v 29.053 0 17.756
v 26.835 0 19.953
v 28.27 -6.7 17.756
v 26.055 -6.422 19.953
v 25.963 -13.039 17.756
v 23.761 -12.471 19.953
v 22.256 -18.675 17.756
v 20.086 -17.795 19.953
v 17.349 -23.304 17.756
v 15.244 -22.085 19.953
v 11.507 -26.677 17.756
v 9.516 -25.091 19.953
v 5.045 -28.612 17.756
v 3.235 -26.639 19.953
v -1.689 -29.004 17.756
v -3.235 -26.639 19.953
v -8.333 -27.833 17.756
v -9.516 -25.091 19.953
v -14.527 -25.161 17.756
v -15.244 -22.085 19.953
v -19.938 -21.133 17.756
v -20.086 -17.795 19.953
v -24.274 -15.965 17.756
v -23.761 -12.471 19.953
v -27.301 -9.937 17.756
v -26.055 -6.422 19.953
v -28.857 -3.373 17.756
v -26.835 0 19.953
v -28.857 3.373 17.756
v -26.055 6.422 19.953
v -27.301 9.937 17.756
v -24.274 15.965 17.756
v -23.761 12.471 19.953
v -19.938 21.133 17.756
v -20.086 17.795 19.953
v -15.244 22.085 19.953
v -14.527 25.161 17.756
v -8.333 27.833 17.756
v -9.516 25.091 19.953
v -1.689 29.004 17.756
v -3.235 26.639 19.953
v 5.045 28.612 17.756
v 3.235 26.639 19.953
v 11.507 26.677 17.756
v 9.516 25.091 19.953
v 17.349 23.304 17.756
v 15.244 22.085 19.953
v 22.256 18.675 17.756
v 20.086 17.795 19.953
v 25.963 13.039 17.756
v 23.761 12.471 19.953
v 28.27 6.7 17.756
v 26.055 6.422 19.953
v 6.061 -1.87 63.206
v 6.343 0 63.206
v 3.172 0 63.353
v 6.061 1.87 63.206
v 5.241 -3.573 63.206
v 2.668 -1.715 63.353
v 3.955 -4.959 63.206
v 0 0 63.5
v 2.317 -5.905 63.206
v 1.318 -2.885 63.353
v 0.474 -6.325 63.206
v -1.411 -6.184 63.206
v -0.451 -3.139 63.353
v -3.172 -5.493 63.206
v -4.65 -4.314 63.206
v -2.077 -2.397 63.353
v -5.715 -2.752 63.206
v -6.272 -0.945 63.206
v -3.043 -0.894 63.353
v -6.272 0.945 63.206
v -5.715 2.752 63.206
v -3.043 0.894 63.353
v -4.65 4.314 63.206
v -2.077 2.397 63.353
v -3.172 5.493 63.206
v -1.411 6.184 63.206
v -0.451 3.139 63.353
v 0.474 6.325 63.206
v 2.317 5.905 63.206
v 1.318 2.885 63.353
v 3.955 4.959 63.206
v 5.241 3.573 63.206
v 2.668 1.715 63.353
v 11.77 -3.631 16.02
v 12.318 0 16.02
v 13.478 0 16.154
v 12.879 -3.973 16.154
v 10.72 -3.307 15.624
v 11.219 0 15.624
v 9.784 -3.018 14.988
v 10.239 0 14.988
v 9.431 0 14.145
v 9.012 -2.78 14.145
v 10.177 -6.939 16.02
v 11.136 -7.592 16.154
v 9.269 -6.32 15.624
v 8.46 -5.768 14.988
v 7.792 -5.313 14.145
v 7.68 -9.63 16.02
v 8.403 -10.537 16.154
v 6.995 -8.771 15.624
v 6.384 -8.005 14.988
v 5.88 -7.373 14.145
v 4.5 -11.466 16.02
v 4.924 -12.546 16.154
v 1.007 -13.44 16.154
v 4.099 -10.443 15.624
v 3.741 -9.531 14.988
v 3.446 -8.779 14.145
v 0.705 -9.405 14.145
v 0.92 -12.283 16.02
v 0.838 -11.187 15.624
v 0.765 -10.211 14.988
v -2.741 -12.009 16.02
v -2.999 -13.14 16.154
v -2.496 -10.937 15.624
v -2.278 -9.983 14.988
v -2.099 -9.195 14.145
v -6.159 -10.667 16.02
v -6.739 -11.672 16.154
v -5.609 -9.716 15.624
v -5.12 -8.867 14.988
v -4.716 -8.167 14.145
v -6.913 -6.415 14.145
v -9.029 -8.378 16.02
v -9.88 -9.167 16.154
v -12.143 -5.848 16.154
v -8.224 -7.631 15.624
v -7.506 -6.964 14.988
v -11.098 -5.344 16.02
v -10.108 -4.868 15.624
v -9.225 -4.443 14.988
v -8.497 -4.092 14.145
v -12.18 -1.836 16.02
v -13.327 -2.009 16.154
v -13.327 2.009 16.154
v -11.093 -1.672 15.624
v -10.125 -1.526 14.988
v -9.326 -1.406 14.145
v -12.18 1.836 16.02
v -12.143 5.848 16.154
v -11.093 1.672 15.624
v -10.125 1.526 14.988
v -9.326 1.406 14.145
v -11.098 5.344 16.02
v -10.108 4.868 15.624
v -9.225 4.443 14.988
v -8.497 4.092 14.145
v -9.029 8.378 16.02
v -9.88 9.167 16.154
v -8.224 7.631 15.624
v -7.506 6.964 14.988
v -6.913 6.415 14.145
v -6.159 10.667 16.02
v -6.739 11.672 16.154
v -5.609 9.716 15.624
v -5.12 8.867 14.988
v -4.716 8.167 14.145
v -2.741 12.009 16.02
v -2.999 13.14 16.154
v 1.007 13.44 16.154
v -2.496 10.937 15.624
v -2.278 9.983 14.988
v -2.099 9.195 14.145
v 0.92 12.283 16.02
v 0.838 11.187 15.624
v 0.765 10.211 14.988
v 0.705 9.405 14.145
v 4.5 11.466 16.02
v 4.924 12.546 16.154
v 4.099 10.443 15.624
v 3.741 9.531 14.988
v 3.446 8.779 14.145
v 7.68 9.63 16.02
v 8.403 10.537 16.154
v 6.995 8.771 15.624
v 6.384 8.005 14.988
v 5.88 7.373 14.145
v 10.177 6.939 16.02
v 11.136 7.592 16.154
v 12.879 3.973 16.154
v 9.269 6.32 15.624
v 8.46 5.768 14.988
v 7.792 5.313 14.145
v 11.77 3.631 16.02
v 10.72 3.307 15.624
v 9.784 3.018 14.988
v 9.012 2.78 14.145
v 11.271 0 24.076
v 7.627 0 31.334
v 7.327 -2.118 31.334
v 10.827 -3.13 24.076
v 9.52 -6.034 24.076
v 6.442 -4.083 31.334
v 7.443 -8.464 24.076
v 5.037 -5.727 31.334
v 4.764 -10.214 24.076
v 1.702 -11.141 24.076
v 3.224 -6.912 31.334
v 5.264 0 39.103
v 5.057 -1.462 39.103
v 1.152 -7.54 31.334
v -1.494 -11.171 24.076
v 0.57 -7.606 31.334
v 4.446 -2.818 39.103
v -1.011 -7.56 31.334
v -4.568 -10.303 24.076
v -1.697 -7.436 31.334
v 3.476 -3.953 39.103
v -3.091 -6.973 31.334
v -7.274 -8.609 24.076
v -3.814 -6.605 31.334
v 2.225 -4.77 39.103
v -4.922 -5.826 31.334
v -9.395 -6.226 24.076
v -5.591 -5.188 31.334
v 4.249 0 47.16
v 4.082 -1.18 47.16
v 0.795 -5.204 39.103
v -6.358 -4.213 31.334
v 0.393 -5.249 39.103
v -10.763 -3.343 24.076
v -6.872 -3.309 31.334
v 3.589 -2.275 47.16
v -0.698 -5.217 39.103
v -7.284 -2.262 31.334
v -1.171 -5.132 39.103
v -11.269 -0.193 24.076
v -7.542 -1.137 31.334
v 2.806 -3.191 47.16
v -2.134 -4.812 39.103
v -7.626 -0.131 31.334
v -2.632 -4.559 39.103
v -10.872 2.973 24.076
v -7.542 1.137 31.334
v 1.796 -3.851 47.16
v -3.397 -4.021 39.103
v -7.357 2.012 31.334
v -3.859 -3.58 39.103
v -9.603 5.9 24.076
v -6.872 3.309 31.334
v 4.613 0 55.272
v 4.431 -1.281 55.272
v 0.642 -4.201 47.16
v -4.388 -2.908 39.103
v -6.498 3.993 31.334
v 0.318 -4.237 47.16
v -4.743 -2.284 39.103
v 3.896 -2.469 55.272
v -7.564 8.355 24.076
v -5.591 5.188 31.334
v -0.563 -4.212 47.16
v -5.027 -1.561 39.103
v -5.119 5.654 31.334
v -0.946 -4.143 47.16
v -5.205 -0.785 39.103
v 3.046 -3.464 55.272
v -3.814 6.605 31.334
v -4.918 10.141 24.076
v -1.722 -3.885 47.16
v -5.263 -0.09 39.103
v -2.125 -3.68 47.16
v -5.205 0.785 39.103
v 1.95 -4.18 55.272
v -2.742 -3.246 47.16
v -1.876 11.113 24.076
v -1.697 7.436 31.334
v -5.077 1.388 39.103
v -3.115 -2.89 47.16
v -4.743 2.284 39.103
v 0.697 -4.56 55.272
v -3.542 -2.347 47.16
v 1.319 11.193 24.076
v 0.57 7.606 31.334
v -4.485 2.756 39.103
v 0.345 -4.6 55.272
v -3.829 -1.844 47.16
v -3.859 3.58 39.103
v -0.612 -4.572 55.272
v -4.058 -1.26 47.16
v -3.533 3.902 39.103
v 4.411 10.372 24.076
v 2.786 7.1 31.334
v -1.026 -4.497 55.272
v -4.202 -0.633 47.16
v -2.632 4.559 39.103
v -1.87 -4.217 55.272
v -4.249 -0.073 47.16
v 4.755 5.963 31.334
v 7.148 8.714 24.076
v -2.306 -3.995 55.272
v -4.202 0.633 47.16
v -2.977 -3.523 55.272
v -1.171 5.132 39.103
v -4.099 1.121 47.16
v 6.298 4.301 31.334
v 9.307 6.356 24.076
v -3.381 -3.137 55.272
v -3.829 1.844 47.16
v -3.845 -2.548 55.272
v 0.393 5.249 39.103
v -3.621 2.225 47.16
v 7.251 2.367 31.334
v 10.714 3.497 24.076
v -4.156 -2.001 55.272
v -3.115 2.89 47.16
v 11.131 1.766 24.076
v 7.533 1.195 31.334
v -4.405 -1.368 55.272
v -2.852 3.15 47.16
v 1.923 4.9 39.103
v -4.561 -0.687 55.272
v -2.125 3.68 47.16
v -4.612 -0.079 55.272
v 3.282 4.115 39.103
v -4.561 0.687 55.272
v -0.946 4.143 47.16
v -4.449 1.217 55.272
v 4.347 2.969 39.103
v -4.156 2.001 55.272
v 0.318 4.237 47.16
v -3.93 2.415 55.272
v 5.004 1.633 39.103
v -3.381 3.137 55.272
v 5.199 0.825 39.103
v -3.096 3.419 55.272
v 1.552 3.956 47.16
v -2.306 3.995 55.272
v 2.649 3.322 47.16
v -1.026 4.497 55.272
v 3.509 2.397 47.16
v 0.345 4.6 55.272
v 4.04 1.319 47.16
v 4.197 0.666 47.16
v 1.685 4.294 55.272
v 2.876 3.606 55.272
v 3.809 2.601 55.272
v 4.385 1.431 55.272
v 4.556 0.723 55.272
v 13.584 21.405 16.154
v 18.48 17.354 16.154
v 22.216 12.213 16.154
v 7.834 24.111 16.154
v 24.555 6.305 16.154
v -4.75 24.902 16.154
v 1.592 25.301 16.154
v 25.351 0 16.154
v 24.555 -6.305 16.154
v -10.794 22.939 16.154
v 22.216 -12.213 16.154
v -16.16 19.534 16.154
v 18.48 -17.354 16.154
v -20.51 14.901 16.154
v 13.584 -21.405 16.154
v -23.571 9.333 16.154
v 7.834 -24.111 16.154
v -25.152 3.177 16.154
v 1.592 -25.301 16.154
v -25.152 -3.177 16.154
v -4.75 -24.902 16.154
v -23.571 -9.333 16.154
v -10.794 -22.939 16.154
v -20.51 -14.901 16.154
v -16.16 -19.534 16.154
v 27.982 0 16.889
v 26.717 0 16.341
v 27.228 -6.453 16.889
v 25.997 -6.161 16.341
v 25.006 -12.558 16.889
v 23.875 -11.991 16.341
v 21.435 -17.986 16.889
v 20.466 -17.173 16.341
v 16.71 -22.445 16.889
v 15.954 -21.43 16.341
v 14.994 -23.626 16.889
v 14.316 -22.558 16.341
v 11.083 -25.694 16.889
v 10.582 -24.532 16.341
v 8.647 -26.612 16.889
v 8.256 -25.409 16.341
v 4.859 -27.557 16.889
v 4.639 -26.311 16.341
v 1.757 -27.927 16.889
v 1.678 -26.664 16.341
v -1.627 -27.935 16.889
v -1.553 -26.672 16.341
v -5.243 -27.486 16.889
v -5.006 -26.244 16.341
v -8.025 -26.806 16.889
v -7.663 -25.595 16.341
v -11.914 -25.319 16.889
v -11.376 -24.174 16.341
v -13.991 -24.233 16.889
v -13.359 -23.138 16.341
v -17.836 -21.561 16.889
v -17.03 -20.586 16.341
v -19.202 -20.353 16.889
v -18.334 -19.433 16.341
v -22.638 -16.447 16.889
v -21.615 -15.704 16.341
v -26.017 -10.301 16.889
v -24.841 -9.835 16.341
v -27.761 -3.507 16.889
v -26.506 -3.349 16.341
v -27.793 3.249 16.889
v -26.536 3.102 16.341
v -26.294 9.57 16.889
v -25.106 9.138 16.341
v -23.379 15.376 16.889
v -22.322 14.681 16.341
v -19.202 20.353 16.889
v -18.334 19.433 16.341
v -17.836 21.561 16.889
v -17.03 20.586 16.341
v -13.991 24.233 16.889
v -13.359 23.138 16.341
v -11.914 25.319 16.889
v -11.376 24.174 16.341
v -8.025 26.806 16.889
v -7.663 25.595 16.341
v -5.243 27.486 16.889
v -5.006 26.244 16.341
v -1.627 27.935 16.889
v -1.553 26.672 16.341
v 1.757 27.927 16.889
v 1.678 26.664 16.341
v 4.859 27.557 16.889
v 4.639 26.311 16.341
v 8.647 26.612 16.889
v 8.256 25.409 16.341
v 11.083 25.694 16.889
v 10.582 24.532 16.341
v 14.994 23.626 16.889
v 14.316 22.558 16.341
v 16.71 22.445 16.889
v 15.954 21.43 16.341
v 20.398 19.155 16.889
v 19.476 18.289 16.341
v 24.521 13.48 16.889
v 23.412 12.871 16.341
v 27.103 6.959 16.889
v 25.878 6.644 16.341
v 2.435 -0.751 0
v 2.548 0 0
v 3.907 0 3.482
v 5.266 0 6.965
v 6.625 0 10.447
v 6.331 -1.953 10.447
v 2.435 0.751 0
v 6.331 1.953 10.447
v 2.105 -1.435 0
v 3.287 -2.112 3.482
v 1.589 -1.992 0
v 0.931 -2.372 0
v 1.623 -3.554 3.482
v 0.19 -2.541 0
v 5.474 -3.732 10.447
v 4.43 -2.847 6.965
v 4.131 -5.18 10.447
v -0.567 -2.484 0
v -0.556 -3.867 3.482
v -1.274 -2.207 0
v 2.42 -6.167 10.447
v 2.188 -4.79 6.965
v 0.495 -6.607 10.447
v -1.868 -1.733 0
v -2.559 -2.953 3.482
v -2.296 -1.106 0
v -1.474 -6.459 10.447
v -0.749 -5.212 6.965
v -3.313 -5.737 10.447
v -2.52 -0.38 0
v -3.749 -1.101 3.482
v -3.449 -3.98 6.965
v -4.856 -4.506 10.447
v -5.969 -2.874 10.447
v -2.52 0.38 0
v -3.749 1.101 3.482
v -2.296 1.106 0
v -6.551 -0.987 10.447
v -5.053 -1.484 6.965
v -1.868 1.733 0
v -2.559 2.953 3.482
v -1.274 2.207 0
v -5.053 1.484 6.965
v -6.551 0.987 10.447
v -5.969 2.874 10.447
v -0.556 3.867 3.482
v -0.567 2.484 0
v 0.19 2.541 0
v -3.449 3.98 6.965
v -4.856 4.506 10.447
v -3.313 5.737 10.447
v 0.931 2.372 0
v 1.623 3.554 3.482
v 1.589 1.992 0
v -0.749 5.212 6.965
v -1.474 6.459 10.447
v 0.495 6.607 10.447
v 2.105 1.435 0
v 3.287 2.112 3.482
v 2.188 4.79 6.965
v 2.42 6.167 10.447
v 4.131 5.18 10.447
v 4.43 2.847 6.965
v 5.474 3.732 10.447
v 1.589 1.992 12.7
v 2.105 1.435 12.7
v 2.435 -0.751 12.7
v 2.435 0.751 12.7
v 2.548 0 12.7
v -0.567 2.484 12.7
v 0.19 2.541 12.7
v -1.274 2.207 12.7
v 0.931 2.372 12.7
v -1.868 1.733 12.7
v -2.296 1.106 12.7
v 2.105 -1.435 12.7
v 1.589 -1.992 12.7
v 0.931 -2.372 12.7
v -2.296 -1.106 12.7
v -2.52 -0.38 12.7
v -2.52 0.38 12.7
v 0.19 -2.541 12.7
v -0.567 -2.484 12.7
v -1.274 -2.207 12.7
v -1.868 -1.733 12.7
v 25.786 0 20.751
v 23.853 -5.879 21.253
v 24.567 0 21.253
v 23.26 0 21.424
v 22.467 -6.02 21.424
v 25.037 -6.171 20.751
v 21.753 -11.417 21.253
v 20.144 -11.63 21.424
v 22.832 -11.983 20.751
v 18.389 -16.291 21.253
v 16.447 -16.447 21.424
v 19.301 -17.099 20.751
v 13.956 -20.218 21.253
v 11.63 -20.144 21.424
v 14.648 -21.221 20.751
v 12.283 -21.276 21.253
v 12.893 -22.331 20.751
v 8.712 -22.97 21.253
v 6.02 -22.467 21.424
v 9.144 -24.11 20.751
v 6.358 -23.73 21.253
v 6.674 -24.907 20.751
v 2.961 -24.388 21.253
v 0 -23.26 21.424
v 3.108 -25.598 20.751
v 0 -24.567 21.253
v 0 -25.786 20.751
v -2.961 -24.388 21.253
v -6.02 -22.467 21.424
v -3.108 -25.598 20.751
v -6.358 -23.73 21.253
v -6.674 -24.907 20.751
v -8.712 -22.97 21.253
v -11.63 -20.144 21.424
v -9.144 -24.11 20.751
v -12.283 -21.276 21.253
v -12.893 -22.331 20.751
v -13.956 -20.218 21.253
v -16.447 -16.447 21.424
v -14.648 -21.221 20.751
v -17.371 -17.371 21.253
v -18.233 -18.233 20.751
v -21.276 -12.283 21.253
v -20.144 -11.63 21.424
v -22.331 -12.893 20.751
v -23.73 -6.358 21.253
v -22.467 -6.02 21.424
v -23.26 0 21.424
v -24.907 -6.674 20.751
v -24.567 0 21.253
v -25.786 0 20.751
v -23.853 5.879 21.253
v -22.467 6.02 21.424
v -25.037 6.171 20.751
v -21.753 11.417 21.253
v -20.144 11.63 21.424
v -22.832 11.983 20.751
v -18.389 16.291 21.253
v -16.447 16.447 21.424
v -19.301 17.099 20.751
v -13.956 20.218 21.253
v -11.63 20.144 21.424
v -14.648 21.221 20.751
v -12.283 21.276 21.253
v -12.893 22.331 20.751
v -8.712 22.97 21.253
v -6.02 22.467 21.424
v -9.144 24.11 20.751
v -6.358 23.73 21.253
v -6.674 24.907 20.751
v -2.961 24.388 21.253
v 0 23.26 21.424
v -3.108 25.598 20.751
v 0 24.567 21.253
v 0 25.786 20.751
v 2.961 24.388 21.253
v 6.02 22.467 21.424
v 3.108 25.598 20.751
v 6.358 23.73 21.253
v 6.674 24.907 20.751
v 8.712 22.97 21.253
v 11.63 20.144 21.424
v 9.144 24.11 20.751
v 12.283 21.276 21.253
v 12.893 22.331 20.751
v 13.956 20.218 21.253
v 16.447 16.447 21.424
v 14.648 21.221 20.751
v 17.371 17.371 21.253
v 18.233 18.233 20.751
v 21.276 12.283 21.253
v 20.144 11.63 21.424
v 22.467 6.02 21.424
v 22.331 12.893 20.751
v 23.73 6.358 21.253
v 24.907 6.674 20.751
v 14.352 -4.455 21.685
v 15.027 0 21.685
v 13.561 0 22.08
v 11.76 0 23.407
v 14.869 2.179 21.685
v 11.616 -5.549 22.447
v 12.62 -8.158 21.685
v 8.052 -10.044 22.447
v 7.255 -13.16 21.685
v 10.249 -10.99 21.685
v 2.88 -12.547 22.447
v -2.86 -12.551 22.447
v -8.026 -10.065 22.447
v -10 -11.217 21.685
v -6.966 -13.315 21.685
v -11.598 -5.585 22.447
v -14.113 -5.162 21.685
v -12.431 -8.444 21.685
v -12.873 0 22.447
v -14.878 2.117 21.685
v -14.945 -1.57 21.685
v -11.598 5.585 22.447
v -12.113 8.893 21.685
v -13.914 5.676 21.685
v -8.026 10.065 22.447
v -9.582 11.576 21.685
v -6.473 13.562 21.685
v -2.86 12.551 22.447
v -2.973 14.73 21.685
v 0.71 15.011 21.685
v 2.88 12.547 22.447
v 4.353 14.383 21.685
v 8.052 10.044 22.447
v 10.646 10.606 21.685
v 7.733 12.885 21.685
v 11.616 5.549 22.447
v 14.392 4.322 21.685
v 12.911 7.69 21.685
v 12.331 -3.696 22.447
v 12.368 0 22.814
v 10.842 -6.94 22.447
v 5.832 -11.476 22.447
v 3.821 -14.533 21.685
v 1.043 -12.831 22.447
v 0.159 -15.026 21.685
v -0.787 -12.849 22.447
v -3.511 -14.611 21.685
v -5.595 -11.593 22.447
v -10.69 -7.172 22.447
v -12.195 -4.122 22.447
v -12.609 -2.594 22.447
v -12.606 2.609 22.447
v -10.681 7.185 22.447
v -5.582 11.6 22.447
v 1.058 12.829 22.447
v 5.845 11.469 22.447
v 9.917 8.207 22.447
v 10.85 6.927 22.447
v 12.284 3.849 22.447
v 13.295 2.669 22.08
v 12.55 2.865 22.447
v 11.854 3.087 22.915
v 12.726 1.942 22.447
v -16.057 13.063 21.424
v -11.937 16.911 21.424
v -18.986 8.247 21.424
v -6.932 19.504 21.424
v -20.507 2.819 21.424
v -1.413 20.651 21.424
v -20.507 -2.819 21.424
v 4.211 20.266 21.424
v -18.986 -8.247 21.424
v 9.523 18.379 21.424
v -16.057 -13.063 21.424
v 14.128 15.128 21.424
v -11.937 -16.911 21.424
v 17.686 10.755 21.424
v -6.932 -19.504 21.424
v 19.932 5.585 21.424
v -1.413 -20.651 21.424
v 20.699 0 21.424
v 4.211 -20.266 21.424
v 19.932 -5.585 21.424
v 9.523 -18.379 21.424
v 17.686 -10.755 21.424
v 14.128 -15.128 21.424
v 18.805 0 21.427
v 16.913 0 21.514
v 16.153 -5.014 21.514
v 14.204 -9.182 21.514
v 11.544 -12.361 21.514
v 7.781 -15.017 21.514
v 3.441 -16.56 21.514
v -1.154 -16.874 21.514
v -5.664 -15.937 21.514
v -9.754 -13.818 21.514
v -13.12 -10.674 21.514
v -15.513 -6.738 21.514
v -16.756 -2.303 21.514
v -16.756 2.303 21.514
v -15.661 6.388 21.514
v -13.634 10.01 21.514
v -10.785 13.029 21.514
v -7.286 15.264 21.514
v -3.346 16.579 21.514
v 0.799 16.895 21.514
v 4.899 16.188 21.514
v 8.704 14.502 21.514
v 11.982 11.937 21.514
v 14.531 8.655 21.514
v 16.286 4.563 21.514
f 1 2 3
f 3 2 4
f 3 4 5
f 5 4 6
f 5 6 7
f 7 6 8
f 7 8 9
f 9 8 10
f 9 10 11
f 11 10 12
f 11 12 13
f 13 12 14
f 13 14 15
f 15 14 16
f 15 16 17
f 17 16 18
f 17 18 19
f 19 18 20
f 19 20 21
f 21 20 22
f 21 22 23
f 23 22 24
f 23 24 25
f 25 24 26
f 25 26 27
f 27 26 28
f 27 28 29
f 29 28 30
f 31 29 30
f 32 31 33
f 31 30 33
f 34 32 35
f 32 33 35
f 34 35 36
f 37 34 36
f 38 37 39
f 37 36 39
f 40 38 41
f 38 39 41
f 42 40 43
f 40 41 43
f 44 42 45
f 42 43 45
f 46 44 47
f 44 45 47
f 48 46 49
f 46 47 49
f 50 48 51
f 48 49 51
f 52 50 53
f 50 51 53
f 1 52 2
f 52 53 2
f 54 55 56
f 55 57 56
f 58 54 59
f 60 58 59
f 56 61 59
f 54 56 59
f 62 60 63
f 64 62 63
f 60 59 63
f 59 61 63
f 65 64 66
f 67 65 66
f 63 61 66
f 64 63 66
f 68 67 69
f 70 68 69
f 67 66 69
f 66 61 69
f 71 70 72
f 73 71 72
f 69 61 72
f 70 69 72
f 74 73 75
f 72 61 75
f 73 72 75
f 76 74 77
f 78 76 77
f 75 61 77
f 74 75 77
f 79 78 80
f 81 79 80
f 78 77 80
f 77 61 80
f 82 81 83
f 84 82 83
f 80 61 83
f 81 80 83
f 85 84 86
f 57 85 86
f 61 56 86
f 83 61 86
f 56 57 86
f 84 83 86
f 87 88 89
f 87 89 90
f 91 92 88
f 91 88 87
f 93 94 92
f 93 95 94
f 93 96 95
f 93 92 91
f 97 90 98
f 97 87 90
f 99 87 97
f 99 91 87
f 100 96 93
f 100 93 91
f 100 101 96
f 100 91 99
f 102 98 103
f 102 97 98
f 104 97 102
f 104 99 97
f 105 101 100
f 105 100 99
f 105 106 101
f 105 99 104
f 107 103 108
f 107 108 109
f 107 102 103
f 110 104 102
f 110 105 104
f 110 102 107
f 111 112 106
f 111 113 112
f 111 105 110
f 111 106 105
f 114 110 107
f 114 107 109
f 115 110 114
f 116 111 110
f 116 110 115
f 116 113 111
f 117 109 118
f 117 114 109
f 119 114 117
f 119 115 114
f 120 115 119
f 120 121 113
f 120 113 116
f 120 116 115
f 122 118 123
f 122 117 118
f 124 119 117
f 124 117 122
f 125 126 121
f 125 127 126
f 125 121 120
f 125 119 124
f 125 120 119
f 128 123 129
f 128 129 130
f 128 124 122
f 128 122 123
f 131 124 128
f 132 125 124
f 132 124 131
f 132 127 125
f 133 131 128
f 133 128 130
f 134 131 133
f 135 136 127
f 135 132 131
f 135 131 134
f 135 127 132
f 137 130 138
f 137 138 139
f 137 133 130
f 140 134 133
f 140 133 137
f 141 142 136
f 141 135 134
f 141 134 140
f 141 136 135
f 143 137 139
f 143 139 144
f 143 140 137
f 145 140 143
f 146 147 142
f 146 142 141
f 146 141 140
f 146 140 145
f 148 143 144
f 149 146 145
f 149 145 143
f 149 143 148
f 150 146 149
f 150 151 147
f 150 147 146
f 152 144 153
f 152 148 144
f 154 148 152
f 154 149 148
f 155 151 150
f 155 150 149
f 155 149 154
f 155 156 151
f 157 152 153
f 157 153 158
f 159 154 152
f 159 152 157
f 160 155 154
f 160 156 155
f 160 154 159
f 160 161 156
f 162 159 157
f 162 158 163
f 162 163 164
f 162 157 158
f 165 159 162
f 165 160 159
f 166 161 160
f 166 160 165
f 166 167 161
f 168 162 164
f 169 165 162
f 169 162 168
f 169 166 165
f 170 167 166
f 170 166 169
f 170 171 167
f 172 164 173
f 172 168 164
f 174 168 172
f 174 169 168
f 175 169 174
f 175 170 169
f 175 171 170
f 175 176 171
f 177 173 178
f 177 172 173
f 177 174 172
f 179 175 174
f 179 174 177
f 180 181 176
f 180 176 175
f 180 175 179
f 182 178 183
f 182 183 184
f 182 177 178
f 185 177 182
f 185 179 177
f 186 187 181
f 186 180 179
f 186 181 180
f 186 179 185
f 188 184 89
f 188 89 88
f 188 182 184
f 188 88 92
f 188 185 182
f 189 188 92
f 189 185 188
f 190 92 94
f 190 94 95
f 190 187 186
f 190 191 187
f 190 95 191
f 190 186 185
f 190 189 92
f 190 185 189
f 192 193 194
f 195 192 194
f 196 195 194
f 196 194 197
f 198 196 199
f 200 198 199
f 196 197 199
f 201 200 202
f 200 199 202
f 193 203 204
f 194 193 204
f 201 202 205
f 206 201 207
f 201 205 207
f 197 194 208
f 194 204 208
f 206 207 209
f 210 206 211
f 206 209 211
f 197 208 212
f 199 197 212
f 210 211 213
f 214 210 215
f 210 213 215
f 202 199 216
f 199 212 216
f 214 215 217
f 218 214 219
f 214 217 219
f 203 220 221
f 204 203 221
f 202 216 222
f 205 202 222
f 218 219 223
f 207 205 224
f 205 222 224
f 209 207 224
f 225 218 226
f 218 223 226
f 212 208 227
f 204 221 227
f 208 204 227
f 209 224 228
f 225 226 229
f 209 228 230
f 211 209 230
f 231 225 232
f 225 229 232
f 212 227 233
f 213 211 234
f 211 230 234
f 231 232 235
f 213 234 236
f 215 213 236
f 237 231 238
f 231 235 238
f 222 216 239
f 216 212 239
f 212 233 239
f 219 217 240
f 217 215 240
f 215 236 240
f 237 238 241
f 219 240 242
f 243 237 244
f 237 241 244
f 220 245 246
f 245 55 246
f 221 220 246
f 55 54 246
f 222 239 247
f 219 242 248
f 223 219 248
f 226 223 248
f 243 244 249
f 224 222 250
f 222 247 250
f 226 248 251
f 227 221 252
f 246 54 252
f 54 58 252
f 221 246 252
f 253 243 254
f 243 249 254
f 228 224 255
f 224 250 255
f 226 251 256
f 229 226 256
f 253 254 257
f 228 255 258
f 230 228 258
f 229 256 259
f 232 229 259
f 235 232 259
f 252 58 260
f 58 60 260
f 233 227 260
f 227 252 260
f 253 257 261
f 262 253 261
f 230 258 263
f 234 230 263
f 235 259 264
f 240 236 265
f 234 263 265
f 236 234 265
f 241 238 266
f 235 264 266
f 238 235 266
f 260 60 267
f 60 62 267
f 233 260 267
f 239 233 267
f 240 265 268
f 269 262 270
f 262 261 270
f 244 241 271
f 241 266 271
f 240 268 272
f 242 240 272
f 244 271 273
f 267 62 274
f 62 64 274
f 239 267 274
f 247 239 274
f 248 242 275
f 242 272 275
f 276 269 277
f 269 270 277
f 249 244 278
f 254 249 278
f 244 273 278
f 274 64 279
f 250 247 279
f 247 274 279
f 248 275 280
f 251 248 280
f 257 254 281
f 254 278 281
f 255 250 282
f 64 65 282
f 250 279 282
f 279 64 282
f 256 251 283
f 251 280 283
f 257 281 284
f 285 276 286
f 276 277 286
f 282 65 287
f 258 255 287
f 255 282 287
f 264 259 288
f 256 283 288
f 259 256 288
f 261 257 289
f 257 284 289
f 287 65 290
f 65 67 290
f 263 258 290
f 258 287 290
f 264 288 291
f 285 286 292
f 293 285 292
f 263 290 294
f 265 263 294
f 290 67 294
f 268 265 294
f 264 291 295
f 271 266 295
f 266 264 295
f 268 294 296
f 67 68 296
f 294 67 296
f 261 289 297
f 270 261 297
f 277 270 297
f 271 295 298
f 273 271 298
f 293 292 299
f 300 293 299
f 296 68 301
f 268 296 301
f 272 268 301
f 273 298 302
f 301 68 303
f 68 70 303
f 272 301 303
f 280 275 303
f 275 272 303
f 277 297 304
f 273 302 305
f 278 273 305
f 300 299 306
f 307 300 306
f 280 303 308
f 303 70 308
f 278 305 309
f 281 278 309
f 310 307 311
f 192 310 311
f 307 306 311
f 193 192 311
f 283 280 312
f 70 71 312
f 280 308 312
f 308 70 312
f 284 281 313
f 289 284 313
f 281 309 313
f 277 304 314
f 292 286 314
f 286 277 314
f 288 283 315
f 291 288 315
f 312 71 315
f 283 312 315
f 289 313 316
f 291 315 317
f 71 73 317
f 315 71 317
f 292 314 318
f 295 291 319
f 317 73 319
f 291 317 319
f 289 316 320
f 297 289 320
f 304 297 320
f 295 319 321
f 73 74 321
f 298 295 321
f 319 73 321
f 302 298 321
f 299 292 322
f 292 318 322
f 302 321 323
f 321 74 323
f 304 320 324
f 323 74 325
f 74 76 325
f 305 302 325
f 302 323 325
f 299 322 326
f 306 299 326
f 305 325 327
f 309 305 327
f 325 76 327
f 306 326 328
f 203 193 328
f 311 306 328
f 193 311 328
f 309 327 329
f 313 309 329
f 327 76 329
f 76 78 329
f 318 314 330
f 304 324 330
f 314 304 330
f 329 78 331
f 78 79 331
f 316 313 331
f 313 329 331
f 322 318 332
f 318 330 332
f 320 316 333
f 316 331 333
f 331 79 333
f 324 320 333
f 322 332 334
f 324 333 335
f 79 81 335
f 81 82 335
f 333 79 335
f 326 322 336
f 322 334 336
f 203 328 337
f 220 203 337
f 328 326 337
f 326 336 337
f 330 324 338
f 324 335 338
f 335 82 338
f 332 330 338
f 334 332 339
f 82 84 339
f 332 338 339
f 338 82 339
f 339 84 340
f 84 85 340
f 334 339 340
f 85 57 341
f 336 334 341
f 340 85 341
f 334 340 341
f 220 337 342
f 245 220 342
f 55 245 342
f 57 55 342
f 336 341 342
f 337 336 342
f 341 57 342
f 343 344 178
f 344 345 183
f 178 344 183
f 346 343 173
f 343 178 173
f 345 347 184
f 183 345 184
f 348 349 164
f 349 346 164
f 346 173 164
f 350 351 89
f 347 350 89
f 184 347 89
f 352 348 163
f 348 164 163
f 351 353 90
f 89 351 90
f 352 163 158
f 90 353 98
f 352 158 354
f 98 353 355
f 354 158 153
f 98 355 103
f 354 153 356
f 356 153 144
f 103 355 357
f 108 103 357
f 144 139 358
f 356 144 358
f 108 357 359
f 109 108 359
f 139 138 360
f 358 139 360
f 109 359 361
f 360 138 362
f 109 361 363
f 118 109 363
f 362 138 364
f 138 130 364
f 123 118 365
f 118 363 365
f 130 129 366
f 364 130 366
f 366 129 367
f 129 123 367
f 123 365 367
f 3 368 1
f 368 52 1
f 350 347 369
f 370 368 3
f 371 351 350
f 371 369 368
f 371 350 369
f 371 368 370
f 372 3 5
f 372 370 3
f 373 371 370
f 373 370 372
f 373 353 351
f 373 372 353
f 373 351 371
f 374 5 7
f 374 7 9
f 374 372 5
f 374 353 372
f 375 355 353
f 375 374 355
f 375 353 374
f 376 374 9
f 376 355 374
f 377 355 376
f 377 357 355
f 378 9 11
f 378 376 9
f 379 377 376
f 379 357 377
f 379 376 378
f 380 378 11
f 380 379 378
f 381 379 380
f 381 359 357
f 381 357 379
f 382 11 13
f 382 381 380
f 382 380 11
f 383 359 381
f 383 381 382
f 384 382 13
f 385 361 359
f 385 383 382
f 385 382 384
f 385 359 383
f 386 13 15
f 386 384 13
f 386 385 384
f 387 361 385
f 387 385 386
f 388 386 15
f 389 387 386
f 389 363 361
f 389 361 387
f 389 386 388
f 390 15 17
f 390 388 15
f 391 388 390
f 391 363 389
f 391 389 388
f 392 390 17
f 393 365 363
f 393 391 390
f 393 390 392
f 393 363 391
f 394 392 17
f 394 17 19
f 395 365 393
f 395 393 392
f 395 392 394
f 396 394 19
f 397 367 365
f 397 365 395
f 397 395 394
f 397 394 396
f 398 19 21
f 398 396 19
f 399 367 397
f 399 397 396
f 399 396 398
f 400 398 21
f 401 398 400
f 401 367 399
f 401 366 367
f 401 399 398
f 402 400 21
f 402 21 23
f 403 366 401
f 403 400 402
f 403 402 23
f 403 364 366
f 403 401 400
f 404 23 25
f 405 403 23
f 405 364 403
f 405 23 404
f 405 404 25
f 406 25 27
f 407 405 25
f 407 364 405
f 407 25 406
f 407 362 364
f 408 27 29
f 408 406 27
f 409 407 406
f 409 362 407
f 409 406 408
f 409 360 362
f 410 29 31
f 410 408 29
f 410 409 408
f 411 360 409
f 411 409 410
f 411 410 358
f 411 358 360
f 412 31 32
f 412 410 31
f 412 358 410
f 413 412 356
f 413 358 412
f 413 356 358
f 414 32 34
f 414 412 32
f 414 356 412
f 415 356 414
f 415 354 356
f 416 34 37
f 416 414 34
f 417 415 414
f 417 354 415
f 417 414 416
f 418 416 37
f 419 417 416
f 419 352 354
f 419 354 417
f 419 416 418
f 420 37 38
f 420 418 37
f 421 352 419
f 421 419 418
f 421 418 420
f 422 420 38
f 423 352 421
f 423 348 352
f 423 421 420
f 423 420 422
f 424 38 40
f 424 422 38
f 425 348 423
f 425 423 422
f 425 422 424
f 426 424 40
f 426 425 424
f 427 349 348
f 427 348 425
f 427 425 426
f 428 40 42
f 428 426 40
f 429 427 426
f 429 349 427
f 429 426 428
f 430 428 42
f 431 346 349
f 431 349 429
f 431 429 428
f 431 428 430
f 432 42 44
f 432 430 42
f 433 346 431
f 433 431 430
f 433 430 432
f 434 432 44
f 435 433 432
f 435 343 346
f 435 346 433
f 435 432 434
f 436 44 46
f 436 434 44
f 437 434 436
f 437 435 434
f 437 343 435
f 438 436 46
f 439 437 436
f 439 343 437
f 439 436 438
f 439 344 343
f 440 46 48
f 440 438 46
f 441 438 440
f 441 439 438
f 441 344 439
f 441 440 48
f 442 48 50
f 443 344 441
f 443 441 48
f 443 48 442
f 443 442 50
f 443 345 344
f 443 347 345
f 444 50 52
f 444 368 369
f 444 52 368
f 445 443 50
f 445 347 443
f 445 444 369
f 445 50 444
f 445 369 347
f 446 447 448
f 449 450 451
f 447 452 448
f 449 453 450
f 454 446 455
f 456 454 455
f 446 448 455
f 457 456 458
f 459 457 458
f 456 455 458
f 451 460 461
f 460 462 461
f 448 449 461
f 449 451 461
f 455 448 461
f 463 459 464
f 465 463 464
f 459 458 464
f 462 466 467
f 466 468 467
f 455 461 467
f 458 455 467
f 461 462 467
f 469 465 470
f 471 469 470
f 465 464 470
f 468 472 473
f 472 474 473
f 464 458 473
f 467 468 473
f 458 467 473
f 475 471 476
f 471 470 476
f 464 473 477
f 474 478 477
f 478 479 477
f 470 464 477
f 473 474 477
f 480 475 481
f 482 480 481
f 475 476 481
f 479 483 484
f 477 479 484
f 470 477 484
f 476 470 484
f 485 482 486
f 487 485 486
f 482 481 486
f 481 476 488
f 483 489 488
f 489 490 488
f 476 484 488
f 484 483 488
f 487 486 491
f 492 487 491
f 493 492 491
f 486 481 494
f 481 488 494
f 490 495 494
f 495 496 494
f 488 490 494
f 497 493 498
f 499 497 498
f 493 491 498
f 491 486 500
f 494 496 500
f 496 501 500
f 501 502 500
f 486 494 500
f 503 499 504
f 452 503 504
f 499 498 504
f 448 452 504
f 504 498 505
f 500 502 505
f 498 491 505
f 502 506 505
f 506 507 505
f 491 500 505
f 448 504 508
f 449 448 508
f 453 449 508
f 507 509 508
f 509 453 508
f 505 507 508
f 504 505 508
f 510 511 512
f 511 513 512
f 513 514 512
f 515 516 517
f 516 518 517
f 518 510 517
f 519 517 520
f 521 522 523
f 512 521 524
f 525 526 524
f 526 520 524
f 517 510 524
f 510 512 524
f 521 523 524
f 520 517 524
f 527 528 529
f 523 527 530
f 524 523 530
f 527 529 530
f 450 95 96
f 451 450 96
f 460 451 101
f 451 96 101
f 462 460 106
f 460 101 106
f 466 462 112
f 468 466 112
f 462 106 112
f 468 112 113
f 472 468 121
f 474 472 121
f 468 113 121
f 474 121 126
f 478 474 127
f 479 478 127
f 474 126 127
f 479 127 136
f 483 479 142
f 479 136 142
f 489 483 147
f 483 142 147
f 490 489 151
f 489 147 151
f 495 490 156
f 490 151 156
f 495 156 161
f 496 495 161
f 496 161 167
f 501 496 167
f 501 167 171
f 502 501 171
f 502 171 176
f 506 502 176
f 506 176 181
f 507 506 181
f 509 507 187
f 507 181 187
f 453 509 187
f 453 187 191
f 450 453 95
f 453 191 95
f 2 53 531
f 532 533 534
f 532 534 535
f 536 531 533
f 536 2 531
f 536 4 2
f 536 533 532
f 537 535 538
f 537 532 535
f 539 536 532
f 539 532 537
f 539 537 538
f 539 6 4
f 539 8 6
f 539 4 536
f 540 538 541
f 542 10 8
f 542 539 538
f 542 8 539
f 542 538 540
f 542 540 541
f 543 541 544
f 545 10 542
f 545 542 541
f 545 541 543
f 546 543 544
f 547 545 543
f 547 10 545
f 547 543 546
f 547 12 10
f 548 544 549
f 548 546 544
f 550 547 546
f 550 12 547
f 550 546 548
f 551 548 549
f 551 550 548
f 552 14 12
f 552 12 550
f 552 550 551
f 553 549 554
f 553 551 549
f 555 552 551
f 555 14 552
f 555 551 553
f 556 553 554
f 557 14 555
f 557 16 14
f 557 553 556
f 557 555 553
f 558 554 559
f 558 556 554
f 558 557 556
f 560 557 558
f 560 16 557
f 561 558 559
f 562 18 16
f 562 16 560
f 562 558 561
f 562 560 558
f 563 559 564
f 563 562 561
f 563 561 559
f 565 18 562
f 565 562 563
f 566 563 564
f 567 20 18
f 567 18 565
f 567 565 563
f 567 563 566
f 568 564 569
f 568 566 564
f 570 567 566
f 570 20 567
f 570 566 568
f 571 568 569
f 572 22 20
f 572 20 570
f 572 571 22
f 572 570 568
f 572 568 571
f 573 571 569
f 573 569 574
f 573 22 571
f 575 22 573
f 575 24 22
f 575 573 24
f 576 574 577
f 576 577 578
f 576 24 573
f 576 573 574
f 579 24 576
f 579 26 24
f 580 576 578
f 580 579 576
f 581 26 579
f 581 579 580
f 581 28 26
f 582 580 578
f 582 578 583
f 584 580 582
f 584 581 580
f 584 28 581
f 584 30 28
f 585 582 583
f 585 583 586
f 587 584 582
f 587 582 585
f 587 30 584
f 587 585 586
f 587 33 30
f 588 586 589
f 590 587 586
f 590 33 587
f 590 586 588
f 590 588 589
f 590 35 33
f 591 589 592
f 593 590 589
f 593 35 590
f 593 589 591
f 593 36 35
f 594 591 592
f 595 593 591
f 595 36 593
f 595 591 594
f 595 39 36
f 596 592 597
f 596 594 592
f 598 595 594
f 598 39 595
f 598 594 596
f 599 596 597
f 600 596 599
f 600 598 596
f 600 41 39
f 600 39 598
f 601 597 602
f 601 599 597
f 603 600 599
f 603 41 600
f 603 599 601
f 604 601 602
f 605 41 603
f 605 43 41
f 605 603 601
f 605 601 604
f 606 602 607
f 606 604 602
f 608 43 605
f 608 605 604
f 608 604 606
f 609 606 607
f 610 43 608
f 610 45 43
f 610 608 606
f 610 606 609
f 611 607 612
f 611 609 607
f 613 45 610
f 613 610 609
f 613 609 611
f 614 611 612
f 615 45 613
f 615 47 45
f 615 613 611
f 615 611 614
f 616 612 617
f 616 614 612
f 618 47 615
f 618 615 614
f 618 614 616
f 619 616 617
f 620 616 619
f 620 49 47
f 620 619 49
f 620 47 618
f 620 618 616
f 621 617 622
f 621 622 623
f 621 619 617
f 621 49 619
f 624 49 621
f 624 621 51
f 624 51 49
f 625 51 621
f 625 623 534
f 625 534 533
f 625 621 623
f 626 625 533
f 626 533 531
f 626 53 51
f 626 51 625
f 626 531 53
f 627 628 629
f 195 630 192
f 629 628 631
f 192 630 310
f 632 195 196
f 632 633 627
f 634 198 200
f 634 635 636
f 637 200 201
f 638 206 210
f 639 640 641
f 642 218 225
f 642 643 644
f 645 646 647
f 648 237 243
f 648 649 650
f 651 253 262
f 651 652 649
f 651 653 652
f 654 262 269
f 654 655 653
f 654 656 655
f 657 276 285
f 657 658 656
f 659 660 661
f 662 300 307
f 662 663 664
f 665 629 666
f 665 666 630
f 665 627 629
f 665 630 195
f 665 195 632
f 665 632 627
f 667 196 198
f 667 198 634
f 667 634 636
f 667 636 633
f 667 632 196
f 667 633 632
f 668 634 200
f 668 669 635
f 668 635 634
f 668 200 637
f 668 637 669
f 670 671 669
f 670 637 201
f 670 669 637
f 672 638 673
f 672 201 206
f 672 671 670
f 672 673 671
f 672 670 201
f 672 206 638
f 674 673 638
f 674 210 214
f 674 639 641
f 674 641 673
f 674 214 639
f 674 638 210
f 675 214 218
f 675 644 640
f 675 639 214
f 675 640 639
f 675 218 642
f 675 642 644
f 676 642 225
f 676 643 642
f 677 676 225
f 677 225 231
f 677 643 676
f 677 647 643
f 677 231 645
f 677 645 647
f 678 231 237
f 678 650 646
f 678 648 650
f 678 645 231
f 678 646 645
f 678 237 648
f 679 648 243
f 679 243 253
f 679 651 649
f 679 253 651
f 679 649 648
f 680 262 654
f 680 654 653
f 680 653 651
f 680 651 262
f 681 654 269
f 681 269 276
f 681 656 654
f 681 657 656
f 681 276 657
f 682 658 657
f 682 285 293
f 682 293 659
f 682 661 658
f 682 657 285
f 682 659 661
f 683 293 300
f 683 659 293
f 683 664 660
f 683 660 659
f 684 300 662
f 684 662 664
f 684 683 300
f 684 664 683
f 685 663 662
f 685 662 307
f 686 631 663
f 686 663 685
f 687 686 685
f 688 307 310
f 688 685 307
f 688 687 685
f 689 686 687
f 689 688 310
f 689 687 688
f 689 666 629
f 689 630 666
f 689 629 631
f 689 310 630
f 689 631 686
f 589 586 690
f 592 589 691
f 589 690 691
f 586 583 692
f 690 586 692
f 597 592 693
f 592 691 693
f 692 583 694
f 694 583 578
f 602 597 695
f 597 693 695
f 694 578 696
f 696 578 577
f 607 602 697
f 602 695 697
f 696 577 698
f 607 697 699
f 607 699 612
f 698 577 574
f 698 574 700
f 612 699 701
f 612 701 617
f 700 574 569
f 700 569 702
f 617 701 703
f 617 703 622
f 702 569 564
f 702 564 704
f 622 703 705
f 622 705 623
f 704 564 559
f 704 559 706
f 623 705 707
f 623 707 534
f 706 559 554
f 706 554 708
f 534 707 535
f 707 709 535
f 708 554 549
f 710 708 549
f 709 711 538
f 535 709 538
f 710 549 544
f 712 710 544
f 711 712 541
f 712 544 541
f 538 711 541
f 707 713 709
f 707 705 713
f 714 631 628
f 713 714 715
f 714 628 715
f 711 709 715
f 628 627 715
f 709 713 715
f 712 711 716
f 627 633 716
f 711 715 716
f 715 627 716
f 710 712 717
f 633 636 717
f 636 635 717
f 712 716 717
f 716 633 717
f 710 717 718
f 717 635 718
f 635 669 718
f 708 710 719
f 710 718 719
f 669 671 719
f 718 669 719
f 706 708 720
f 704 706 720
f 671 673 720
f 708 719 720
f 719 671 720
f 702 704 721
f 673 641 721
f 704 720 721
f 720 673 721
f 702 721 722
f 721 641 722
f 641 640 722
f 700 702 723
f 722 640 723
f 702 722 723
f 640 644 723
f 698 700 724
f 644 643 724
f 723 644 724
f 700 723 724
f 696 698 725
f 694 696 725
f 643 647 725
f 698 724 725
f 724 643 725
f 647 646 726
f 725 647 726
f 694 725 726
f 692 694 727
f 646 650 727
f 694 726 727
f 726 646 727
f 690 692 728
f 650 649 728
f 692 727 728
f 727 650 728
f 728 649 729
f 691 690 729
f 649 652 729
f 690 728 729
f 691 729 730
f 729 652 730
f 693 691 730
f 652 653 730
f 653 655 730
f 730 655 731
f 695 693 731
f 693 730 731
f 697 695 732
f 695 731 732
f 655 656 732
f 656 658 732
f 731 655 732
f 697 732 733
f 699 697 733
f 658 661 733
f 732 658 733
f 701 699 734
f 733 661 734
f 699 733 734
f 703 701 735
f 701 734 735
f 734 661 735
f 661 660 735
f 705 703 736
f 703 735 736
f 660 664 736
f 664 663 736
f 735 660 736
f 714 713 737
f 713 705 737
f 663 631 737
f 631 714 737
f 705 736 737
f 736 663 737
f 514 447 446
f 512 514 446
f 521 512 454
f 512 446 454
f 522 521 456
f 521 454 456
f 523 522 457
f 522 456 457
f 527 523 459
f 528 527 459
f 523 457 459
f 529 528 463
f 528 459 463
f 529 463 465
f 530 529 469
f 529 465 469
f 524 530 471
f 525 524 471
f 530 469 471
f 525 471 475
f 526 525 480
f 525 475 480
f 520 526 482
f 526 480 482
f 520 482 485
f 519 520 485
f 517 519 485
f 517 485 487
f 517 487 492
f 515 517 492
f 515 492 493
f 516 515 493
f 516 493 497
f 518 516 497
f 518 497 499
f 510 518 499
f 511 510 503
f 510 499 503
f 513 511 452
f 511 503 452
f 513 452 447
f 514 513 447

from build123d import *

# Parameters (mm, degrees)
F2_DEPTH = 12.7
F3_R     = 5.08
F5_R     = 5.08
F6_R     = 5.08


# Not quite as in the source:
# - a fillet or chamfer that OpenCascade refuses, or shapes differently, is made with other operations: its cross-section is extruded or revolved along the edge and cut away or added


with BuildPart() as f1:
    # F0 (on Front) → F1 (revolve)
    with BuildSketch(Plane.XZ):
        with BuildLine():
            Line((6.3432058776, 63.206334895), (0, 63.5))
            Line((0, 63.5), (0, 0))
            Line((0, 0), (2.5480911136, 0))
            Line((2.5480911136, 0), (6.6250329837, 10.4471649975))
            Line((6.6250329837, 10.4471649975), (10.9556252941, 16.1543861032))
            Line((10.9556252941, 16.1543861032), (30.48, 16.1543861032))
            Line((30.48, 16.1543861032), (30.4299078499, 21.4240159839))
            Line((30.4299078499, 21.4240159839), (20.699405237, 21.4240159839))
            ThreePointArc((20.699405237, 21.4240159839), (16.6336106625, 21.5337881018), (12.597086859, 22.0329985023))
            ThreePointArc((12.597086859, 22.0329985023), (4.7528583484, 41.9031506128), (6.3432058776, 63.206334895))
        make_face()
    revolve(axis=Axis((0, 0, 31.75), (0, 0, -1)))

    # F2 (cut): a face of the model
    f2_faces = [f1.faces().sort_by_distance(p)[0] for p in [
        (0, 0, 0),
    ]]
    extrude(f2_faces, amount=-F2_DEPTH, mode=Mode.SUBTRACT)

    # F3
    f3_edges = [f1.edges().sort_by_distance(p)[0] for p in [
        (-10.955625, 0, 16.154386),
        (-30.48, 0, 16.154386),
    ]]
    fillet(f3_edges, radius=F3_R)

    # F4: chamfer of 5.08 on 1 edges, made by hand

    # F4_s1 → F4_t2 (revolve, cut)
    with BuildSketch(Plane.XZ):
        Polygon((30.478195231, 16.3442454843), (25.3499078499, 21.4240159839), (30.4299078499, 21.4240159839), align=None)
    revolve(axis=Axis((0, 0, 21.4240159839), (0, 0, -1)), mode=Mode.SUBTRACT)

    # F5
    f5_edges = [f1.edges().sort_by_distance(p)[0] for p in [
        (-20.699405, 0, 21.424016),
        (-12.597087, 0, 22.032999),
        (16.633611, 0, 21.533788),
    ]]
    fillet(f5_edges, radius=F5_R)

    # F6
    f6_edges = [f1.edges().sort_by_distance(p)[0] for p in [
        (-25.349908, 0, 21.424016),
        (-20.699405, 0, 21.424016),
    ]]
    fillet(f6_edges, radius=F6_R)


solid = f1.part
